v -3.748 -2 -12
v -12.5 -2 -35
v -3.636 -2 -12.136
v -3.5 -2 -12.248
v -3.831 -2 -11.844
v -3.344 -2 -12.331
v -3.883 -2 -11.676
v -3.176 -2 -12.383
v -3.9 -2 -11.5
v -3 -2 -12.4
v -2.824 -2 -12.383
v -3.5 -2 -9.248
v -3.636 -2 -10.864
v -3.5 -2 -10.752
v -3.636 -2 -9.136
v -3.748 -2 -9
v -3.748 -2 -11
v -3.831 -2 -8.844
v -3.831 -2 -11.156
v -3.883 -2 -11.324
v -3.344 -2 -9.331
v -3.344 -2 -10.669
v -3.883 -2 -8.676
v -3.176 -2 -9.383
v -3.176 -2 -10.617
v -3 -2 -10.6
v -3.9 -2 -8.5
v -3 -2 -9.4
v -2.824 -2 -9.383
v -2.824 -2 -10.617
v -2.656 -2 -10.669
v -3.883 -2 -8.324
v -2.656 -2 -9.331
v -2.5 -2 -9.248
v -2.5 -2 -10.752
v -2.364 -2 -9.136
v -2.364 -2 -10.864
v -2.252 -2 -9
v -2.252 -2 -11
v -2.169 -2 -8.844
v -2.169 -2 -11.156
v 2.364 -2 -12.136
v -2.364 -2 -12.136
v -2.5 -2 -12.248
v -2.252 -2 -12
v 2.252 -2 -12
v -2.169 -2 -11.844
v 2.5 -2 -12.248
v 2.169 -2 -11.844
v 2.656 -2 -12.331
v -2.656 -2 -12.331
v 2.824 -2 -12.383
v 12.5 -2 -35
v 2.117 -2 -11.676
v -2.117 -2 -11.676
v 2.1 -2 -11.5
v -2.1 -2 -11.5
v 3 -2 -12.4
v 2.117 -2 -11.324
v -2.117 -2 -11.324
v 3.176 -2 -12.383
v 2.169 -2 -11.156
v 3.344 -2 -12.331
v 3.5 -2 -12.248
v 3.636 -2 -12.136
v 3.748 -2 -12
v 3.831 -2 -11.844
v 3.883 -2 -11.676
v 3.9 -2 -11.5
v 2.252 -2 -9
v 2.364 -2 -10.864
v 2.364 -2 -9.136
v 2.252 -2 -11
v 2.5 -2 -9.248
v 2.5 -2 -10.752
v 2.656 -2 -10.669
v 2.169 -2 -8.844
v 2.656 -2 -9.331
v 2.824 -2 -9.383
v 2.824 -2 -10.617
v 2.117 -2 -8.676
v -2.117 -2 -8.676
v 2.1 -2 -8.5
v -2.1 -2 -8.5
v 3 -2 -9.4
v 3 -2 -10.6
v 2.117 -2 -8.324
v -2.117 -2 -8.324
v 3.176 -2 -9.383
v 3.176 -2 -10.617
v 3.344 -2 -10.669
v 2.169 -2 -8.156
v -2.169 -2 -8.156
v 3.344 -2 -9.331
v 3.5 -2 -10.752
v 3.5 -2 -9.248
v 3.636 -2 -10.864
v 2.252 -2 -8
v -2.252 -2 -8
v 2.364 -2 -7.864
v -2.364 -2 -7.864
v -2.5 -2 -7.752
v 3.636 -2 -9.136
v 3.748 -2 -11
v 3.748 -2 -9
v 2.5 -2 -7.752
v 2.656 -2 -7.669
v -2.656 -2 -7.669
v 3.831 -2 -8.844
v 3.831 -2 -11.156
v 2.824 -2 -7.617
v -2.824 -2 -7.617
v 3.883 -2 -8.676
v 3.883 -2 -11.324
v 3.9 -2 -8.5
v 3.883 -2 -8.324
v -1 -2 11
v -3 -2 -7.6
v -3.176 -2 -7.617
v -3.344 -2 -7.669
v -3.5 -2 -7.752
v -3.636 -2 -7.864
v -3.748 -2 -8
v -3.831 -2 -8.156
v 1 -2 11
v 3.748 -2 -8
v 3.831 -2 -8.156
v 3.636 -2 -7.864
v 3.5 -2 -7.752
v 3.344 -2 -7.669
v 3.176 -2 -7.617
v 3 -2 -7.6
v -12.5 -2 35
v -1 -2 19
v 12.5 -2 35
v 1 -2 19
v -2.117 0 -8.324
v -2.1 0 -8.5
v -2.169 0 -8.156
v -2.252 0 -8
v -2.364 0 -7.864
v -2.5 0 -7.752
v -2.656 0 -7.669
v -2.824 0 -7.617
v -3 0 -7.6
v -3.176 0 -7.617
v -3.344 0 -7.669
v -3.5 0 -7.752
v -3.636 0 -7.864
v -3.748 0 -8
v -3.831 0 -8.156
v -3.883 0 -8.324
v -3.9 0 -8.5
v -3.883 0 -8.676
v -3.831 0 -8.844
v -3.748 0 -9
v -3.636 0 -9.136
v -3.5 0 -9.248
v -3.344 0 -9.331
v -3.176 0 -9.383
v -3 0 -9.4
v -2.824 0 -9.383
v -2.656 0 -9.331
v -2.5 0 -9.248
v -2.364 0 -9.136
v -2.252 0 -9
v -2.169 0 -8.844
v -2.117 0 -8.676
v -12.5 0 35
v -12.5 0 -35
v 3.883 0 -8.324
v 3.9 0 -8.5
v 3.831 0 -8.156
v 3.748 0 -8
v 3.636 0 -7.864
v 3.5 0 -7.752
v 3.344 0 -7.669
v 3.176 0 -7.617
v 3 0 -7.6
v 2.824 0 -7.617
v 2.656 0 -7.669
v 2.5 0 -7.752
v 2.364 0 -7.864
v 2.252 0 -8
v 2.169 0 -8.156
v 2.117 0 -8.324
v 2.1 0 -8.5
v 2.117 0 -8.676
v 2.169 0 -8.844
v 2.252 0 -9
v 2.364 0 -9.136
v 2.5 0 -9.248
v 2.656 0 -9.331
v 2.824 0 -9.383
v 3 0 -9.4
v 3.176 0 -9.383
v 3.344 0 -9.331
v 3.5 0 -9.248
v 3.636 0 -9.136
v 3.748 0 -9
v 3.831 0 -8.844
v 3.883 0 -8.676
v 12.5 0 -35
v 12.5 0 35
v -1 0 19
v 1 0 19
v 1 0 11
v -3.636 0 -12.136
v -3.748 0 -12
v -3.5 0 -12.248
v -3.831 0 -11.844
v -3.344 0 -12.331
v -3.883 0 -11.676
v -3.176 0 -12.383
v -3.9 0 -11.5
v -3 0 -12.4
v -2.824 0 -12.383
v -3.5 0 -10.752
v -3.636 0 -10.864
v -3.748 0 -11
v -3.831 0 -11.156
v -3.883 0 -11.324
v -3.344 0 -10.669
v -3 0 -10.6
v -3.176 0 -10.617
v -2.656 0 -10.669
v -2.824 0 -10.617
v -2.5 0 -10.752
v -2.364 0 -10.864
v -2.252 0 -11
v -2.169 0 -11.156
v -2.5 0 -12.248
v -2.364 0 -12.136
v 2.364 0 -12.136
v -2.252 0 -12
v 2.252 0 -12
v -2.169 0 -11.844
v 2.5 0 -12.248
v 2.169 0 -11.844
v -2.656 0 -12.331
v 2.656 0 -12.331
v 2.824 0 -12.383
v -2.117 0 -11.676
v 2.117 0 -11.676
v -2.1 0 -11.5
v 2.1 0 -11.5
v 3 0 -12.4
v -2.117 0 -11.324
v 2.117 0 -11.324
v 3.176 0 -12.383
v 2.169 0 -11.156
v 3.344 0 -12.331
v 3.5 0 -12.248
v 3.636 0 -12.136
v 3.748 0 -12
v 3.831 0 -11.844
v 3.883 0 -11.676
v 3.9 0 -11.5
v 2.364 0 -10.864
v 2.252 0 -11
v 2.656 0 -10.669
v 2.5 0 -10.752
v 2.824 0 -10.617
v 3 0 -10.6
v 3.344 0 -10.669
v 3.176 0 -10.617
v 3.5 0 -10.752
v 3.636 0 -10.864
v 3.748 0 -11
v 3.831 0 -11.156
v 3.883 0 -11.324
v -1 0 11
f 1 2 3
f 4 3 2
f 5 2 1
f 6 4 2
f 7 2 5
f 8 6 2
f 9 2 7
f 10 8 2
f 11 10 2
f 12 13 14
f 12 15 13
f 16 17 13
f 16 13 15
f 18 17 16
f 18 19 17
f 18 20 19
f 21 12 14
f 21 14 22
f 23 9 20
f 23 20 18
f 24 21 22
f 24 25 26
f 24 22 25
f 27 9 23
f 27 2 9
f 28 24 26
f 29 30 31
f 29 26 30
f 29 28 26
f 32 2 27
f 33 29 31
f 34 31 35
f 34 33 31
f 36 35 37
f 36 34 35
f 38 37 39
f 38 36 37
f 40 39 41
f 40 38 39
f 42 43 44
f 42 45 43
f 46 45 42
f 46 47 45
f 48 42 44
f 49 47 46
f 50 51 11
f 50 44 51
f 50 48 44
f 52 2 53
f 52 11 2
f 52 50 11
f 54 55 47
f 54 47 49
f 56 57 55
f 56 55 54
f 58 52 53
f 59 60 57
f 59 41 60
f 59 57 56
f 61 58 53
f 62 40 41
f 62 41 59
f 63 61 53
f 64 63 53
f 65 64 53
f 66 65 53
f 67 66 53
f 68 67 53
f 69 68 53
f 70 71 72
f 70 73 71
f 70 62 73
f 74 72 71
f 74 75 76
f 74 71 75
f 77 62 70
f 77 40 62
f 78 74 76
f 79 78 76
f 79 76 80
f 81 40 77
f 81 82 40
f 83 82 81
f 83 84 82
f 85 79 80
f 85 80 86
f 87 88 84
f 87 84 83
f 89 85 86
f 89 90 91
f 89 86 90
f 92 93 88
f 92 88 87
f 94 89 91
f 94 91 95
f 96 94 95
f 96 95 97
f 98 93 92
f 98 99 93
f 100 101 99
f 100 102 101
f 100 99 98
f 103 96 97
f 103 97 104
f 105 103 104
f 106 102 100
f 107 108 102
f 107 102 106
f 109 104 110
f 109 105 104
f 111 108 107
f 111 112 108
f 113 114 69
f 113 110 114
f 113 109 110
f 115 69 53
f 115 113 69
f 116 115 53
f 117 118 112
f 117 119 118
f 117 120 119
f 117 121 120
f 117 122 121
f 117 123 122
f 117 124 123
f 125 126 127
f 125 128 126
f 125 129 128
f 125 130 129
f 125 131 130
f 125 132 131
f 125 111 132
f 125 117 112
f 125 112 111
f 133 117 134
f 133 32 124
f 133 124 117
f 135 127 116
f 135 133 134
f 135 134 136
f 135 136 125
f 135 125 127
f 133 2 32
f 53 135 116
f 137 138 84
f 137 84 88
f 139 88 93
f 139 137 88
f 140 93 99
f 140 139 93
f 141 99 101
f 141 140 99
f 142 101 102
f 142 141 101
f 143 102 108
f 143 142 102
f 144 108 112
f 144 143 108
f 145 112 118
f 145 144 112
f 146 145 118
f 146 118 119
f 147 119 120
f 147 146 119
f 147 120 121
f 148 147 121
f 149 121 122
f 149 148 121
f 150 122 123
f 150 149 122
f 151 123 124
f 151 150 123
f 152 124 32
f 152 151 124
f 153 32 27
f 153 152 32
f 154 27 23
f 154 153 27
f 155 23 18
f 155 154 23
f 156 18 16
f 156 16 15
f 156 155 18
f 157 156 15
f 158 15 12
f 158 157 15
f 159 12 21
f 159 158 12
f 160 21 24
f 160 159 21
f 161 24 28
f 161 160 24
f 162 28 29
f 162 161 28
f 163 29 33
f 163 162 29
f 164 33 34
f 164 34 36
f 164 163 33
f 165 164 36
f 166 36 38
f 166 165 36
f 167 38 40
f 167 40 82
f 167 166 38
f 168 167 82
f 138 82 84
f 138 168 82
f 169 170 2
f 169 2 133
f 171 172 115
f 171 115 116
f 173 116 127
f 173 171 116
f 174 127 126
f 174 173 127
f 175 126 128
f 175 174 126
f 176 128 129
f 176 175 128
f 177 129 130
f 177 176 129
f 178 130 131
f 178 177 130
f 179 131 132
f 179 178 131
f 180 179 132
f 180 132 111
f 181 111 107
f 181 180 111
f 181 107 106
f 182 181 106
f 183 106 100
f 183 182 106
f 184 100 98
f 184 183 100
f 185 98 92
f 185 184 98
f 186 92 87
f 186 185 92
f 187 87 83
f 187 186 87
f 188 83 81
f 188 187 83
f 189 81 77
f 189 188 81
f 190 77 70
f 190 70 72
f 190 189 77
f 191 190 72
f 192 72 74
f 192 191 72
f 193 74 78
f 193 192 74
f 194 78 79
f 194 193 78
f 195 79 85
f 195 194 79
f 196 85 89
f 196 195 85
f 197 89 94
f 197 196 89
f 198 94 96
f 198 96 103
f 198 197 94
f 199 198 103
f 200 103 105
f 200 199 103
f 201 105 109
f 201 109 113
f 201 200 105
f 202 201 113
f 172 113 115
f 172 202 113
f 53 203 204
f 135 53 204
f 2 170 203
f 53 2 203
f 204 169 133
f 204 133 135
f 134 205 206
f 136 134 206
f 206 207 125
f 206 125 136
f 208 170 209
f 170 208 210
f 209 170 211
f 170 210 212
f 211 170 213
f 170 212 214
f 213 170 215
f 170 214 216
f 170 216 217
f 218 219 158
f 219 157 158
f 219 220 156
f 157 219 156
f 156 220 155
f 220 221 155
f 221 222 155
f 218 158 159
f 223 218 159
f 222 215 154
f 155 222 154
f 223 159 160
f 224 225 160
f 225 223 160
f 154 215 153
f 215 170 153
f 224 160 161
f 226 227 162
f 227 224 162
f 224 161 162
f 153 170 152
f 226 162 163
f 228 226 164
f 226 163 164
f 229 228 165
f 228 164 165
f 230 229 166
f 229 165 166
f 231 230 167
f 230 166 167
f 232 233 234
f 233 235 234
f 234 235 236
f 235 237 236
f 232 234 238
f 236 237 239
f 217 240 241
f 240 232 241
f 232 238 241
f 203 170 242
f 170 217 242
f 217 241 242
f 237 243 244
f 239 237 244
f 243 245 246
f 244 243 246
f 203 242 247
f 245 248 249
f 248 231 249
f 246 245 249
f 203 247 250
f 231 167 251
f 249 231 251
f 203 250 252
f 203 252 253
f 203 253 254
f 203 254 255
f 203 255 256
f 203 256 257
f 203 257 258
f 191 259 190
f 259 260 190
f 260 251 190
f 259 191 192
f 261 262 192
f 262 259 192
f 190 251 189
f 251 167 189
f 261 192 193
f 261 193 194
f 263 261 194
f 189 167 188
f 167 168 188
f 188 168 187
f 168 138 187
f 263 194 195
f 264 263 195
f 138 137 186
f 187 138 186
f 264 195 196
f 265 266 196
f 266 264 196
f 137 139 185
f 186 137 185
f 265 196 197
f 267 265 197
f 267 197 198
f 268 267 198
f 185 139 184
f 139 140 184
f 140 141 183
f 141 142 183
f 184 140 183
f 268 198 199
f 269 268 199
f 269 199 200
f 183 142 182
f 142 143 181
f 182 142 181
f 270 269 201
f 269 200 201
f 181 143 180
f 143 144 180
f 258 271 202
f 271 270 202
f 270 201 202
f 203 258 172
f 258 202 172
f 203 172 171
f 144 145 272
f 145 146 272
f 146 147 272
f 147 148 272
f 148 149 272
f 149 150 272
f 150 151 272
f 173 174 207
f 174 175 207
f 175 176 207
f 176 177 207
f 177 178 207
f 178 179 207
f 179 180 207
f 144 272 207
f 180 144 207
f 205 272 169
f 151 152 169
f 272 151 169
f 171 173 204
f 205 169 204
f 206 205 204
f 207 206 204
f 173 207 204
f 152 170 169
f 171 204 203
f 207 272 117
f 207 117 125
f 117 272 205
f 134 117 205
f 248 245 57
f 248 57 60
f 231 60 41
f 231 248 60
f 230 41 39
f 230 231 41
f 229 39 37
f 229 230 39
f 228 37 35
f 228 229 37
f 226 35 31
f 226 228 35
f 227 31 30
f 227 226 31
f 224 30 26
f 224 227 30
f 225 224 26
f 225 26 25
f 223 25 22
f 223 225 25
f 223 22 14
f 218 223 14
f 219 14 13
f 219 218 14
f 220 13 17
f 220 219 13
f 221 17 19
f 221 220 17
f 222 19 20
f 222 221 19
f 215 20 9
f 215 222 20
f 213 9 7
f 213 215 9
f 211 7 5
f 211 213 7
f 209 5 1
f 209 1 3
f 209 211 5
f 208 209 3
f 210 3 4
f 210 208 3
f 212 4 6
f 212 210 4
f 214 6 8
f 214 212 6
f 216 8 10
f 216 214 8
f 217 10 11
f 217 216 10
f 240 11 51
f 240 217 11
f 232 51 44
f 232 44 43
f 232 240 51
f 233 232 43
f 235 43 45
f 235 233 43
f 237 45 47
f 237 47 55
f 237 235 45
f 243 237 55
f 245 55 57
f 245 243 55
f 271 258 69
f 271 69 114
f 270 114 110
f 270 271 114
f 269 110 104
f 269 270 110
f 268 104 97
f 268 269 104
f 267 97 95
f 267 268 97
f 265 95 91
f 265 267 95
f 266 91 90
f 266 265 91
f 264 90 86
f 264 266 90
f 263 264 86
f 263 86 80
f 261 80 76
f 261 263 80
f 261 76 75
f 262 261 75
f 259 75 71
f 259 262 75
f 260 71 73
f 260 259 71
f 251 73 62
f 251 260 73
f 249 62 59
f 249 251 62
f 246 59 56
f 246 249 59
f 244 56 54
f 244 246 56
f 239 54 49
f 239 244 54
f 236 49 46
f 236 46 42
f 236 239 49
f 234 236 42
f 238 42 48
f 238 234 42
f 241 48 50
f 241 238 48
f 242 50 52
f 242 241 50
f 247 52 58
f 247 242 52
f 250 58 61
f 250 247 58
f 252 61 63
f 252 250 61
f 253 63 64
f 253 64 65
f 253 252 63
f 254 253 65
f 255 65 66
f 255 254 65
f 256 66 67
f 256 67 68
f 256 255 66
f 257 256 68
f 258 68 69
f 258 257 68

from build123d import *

# Parameters (mm, degrees)
F0_W     = 25
F0_H     = 70
F0_R     = 0.9
F0_W_2   = 2
F0_H_2   = 8
F1_DEPTH = 2


with BuildPart() as f1:
    # F0 (on Front) → F1 (new body)
    with BuildSketch(Plane.XZ):
        Rectangle(F0_W, F0_H)
        with Locations((-3, -11.5)):
            Circle(F0_R, mode=Mode.SUBTRACT)
        with Locations((-3, -8.5)):
            Circle(F0_R, mode=Mode.SUBTRACT)
        with Locations((3, -11.5)):
            Circle(F0_R, mode=Mode.SUBTRACT)
        with Locations((3, -8.5)):
            Circle(F0_R, mode=Mode.SUBTRACT)
        with Locations((0, 15)):
            Rectangle(F0_W_2, F0_H_2, mode=Mode.SUBTRACT)
    extrude(amount=F1_DEPTH)


solid = f1.part
